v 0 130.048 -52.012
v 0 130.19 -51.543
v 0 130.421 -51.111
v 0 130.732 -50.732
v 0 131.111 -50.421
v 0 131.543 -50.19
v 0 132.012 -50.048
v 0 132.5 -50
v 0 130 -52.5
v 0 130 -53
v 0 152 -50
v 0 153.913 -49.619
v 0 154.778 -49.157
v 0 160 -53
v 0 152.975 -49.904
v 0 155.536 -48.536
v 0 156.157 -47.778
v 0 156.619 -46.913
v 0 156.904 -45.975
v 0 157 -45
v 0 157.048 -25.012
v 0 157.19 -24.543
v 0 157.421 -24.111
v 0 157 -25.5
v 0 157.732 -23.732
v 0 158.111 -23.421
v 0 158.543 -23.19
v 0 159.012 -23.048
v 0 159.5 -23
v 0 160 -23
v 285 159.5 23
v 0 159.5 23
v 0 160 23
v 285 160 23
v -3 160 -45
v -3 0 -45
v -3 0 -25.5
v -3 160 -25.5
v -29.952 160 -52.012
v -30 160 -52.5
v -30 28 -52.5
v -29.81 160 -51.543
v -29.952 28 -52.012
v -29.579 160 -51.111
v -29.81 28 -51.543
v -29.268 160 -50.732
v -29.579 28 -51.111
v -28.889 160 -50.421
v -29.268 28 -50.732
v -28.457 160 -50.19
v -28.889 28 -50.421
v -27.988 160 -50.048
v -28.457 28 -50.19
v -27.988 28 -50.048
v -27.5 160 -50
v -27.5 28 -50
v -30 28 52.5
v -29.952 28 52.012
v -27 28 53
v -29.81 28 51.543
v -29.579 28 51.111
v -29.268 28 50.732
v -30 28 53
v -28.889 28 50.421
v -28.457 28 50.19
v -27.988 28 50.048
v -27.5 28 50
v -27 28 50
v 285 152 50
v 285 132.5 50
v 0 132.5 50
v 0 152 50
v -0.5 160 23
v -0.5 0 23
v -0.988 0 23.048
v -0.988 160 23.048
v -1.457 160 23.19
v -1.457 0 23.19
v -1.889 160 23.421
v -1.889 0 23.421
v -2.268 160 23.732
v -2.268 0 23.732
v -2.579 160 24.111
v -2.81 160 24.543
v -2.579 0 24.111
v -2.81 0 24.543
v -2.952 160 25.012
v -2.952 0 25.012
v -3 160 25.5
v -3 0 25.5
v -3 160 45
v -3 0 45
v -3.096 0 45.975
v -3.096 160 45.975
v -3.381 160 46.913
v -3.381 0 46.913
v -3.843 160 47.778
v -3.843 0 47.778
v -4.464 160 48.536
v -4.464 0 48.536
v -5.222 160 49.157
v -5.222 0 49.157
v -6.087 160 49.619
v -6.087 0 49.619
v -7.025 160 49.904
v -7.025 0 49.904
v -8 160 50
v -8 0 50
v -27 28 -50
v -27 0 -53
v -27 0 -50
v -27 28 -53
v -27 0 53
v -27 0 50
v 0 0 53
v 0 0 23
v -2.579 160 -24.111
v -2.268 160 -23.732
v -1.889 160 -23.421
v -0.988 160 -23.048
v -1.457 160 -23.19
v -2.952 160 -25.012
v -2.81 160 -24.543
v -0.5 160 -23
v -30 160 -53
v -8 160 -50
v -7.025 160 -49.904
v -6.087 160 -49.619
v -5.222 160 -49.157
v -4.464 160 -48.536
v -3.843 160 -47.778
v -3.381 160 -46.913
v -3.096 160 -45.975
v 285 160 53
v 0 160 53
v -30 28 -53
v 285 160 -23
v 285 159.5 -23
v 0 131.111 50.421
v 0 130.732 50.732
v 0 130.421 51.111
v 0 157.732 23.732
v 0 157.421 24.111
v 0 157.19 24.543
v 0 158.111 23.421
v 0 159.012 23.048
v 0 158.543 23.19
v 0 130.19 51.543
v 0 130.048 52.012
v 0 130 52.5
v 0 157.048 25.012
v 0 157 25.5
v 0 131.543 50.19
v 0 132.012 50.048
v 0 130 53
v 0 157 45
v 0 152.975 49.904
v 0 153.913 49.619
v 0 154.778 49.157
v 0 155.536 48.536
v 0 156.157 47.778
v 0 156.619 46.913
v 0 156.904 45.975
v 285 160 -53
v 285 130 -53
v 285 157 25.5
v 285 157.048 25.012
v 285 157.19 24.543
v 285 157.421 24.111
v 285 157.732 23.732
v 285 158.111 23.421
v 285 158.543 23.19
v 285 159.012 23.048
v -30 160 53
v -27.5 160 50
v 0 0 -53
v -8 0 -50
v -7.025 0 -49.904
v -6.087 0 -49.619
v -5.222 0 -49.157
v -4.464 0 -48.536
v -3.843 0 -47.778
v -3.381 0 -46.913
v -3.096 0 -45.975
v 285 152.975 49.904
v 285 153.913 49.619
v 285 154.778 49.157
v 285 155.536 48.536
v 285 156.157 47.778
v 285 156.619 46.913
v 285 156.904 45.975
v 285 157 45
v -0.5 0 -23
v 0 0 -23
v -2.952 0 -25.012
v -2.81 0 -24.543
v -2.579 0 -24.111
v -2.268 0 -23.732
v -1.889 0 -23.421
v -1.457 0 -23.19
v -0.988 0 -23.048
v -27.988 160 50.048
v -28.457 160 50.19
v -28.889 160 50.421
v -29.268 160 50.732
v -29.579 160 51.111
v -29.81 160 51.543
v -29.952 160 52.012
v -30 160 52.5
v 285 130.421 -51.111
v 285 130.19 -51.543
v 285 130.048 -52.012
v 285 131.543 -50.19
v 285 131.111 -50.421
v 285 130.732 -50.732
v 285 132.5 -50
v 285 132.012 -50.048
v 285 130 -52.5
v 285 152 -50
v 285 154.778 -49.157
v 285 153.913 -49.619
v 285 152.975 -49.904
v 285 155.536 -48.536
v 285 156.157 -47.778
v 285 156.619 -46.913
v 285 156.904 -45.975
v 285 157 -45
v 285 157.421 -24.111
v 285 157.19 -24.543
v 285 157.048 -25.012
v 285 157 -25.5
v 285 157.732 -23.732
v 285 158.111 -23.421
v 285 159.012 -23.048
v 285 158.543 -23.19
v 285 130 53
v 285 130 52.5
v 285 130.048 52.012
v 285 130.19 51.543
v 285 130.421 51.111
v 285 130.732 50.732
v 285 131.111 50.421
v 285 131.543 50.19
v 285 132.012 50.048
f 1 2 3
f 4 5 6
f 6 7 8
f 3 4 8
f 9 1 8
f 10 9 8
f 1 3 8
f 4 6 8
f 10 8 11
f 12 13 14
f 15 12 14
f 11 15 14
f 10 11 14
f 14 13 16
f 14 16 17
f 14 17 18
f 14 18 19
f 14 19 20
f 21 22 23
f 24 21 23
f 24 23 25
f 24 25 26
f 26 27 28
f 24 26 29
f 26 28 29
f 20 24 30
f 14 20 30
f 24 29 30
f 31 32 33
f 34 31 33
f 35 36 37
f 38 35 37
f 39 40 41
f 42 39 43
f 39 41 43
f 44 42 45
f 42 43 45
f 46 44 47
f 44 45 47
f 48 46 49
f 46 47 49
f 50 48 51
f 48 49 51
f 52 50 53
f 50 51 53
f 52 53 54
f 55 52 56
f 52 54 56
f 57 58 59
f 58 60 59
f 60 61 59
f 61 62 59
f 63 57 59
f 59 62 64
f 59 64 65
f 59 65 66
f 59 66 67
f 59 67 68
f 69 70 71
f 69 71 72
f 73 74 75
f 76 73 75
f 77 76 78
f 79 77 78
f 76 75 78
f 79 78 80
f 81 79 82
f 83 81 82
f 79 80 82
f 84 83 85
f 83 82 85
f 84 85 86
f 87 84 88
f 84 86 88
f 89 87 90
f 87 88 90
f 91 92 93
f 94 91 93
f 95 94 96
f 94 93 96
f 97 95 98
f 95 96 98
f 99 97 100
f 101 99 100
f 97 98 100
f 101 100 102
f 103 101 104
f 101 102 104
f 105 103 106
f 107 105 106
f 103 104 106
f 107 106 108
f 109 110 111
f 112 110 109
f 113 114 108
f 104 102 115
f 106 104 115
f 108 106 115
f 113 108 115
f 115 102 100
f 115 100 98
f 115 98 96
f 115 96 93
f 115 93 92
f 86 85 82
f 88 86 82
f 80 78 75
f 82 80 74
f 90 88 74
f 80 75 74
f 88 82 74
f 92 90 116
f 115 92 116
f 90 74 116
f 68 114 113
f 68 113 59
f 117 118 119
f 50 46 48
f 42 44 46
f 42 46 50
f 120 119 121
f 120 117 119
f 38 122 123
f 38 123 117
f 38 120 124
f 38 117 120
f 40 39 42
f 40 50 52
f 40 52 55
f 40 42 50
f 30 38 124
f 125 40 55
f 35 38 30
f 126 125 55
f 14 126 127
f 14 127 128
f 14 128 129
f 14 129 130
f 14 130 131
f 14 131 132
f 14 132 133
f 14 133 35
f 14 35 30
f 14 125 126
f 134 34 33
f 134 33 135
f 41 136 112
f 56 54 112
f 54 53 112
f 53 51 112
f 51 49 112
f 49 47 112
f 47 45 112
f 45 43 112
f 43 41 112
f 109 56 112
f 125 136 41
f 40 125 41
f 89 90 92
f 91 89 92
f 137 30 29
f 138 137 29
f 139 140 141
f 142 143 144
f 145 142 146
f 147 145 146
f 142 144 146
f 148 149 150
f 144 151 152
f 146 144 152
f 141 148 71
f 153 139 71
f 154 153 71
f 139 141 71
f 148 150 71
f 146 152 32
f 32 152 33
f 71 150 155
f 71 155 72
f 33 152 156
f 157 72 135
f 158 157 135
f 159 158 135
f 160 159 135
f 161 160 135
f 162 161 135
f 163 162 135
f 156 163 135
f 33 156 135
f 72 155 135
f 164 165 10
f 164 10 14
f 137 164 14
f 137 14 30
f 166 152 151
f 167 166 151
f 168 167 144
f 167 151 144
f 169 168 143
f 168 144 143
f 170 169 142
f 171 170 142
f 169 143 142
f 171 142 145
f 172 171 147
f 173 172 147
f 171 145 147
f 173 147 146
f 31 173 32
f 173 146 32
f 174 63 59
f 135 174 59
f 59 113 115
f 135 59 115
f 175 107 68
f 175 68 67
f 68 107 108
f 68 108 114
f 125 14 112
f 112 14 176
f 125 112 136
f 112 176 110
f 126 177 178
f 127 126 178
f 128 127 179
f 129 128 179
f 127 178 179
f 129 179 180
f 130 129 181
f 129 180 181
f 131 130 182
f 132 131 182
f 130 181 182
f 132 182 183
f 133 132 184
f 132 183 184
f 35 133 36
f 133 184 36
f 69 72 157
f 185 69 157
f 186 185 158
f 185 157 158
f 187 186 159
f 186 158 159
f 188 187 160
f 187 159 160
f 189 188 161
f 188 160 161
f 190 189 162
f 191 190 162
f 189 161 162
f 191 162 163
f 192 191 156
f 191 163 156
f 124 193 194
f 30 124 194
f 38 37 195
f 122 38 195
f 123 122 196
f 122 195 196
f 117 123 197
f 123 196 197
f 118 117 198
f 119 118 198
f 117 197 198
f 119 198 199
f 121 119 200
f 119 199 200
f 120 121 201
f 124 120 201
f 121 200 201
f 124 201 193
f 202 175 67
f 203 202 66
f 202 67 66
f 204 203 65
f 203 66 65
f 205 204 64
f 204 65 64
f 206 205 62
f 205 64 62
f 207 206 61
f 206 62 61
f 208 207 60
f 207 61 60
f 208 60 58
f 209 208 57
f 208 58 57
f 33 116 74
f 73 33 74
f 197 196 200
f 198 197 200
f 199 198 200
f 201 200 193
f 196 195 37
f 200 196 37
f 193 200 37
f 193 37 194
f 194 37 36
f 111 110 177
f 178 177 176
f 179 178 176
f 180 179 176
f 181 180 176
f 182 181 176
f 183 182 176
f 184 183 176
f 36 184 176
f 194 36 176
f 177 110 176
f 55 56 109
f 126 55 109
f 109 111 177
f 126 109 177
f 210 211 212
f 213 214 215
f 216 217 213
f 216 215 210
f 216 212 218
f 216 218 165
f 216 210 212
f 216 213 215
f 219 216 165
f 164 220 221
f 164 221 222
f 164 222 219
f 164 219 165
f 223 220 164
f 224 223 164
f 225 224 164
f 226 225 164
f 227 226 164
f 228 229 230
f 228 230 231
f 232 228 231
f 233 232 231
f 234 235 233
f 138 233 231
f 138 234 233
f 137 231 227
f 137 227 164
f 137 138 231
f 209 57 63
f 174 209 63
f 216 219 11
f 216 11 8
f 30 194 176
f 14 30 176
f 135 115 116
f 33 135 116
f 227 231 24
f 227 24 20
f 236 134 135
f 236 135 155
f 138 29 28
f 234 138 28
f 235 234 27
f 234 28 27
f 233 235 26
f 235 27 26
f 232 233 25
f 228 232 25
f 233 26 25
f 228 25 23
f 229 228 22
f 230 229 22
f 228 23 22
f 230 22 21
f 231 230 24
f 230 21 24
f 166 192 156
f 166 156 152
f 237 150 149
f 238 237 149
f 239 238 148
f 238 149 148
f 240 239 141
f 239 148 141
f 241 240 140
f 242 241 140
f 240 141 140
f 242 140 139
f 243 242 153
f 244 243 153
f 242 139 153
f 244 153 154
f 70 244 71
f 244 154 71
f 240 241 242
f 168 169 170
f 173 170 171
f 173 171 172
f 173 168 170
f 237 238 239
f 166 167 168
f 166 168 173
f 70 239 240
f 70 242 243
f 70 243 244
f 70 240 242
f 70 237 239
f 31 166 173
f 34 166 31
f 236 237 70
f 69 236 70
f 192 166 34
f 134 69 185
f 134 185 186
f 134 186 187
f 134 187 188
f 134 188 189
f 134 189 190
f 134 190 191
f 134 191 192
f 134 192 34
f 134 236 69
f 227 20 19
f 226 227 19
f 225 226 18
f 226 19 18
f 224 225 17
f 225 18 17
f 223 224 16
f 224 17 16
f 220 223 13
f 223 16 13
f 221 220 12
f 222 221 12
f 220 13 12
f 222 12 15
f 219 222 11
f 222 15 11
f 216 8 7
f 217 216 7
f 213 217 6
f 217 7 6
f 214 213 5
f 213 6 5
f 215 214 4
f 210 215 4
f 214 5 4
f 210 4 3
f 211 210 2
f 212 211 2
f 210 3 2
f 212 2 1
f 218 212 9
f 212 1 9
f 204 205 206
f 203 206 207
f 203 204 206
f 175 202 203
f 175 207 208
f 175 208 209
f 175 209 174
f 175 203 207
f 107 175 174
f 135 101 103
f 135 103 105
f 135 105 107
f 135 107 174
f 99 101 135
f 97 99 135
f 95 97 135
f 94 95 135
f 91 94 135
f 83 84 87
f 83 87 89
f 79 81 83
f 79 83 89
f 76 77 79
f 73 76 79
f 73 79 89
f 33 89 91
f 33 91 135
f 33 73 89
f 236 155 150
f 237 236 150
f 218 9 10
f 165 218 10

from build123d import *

# Parameters (mm, degrees)
DIN_L_ANGLE_L30X30X3_1_DEPTH   = 285
DIN_L_ANGLE_L30X30X3_1_2_DEPTH = 160
CUT_EXTRUDE1_DEPTH             = 344.600058207
CUT_EXTRUDE1_DEPTH_BACK        = 344.600058207
SKETCH2_W                      = 3
SKETCH2_H                      = 28


# Read off the part's stored shape, not the designer's step: <DIN><l angle><L30x30x3>(1)
with BuildPart() as part:
    # <DIN><l angle><L30x30x3>(1) outline → <DIN><l angle><L30x30x3>(1) (new body)
    with BuildSketch(Plane.YZ):
        with BuildLine():
            Line((130, -53), (160, -53))
            Line((160, -53), (160, -23))
            Line((160, -23), (159.5, -23))
            ThreePointArc((159.5, -23), (157.732233047, -23.732233047), (157, -25.5))
            Line((157, -25.5), (157, -45))
            ThreePointArc((157, -45), (155.535533906, -48.535533906), (152, -50))
            Line((152, -50), (132.5, -50))
            ThreePointArc((132.5, -50), (130.732233047, -50.732233047), (130, -52.5))
            Line((130, -52.5), (130, -53))
        make_face()
        with BuildLine():
            Line((160, 23), (160, 53))
            Line((160, 53), (130, 53))
            Line((130, 53), (130, 52.5))
            ThreePointArc((130, 52.5), (130.732233047, 50.732233047), (132.5, 50))
            Line((132.5, 50), (152, 50))
            ThreePointArc((152, 50), (155.535533906, 48.535533906), (157, 45))
            Line((157, 45), (157, 25.5))
            ThreePointArc((157, 25.5), (157.732233047, 23.732233047), (159.5, 23))
            Line((159.5, 23), (160, 23))
        make_face()
    extrude(amount=DIN_L_ANGLE_L30X30X3_1_DEPTH)


with BuildPart() as body_2:
    # DIN_l angle_L30x30x3_1 2 outline → DIN_l angle_L30x30x3_1 2 (new body)
    with BuildSketch(Plane(origin=(0, 0, 0), x_dir=(1, 0, 0), z_dir=(0, 1, 0))):
        with BuildLine():
            Line((0, 23), (0, 53))
            Line((0, 53), (-30, 53))
            Line((-30, 53), (-30, 52.5))
            ThreePointArc((-30, 52.5), (-29.267766953, 50.732233047), (-27.5, 50))
            Line((-27.5, 50), (-8, 50))
            ThreePointArc((-8, 50), (-4.464466094, 48.535533906), (-3, 45))
            Line((-3, 45), (-3, 25.5))
            ThreePointArc((-3, 25.5), (-2.267766953, 23.732233047), (-0.5, 23))
            Line((-0.5, 23), (0, 23))
        make_face()
        with BuildLine():
            Line((-30, -53), (0, -53))
            Line((0, -53), (0, -23))
            Line((0, -23), (-0.5, -23))
            ThreePointArc((-0.5, -23), (-2.267766953, -23.732233047), (-3, -25.5))
            Line((-3, -25.5), (-3, -45))
            ThreePointArc((-3, -45), (-4.464466094, -48.535533906), (-8, -50))
            Line((-8, -50), (-27.5, -50))
            ThreePointArc((-27.5, -50), (-29.267766953, -50.732233047), (-30, -52.5))
            Line((-30, -52.5), (-30, -53))
        make_face()
    extrude(amount=DIN_L_ANGLE_L30X30X3_1_2_DEPTH)

    # Sketch2 → Cut-Extrude1 (cut, two sides: drawn at the far end of the back side and taken through both)
    with BuildSketch(Plane.XY.offset(53).offset(-CUT_EXTRUDE1_DEPTH_BACK)):
        with Locations((-28.5, 14)):
            Rectangle(SKETCH2_W, SKETCH2_H)
    extrude(amount=CUT_EXTRUDE1_DEPTH + CUT_EXTRUDE1_DEPTH_BACK, mode=Mode.SUBTRACT)


solid = Compound([part.part, body_2.part])
